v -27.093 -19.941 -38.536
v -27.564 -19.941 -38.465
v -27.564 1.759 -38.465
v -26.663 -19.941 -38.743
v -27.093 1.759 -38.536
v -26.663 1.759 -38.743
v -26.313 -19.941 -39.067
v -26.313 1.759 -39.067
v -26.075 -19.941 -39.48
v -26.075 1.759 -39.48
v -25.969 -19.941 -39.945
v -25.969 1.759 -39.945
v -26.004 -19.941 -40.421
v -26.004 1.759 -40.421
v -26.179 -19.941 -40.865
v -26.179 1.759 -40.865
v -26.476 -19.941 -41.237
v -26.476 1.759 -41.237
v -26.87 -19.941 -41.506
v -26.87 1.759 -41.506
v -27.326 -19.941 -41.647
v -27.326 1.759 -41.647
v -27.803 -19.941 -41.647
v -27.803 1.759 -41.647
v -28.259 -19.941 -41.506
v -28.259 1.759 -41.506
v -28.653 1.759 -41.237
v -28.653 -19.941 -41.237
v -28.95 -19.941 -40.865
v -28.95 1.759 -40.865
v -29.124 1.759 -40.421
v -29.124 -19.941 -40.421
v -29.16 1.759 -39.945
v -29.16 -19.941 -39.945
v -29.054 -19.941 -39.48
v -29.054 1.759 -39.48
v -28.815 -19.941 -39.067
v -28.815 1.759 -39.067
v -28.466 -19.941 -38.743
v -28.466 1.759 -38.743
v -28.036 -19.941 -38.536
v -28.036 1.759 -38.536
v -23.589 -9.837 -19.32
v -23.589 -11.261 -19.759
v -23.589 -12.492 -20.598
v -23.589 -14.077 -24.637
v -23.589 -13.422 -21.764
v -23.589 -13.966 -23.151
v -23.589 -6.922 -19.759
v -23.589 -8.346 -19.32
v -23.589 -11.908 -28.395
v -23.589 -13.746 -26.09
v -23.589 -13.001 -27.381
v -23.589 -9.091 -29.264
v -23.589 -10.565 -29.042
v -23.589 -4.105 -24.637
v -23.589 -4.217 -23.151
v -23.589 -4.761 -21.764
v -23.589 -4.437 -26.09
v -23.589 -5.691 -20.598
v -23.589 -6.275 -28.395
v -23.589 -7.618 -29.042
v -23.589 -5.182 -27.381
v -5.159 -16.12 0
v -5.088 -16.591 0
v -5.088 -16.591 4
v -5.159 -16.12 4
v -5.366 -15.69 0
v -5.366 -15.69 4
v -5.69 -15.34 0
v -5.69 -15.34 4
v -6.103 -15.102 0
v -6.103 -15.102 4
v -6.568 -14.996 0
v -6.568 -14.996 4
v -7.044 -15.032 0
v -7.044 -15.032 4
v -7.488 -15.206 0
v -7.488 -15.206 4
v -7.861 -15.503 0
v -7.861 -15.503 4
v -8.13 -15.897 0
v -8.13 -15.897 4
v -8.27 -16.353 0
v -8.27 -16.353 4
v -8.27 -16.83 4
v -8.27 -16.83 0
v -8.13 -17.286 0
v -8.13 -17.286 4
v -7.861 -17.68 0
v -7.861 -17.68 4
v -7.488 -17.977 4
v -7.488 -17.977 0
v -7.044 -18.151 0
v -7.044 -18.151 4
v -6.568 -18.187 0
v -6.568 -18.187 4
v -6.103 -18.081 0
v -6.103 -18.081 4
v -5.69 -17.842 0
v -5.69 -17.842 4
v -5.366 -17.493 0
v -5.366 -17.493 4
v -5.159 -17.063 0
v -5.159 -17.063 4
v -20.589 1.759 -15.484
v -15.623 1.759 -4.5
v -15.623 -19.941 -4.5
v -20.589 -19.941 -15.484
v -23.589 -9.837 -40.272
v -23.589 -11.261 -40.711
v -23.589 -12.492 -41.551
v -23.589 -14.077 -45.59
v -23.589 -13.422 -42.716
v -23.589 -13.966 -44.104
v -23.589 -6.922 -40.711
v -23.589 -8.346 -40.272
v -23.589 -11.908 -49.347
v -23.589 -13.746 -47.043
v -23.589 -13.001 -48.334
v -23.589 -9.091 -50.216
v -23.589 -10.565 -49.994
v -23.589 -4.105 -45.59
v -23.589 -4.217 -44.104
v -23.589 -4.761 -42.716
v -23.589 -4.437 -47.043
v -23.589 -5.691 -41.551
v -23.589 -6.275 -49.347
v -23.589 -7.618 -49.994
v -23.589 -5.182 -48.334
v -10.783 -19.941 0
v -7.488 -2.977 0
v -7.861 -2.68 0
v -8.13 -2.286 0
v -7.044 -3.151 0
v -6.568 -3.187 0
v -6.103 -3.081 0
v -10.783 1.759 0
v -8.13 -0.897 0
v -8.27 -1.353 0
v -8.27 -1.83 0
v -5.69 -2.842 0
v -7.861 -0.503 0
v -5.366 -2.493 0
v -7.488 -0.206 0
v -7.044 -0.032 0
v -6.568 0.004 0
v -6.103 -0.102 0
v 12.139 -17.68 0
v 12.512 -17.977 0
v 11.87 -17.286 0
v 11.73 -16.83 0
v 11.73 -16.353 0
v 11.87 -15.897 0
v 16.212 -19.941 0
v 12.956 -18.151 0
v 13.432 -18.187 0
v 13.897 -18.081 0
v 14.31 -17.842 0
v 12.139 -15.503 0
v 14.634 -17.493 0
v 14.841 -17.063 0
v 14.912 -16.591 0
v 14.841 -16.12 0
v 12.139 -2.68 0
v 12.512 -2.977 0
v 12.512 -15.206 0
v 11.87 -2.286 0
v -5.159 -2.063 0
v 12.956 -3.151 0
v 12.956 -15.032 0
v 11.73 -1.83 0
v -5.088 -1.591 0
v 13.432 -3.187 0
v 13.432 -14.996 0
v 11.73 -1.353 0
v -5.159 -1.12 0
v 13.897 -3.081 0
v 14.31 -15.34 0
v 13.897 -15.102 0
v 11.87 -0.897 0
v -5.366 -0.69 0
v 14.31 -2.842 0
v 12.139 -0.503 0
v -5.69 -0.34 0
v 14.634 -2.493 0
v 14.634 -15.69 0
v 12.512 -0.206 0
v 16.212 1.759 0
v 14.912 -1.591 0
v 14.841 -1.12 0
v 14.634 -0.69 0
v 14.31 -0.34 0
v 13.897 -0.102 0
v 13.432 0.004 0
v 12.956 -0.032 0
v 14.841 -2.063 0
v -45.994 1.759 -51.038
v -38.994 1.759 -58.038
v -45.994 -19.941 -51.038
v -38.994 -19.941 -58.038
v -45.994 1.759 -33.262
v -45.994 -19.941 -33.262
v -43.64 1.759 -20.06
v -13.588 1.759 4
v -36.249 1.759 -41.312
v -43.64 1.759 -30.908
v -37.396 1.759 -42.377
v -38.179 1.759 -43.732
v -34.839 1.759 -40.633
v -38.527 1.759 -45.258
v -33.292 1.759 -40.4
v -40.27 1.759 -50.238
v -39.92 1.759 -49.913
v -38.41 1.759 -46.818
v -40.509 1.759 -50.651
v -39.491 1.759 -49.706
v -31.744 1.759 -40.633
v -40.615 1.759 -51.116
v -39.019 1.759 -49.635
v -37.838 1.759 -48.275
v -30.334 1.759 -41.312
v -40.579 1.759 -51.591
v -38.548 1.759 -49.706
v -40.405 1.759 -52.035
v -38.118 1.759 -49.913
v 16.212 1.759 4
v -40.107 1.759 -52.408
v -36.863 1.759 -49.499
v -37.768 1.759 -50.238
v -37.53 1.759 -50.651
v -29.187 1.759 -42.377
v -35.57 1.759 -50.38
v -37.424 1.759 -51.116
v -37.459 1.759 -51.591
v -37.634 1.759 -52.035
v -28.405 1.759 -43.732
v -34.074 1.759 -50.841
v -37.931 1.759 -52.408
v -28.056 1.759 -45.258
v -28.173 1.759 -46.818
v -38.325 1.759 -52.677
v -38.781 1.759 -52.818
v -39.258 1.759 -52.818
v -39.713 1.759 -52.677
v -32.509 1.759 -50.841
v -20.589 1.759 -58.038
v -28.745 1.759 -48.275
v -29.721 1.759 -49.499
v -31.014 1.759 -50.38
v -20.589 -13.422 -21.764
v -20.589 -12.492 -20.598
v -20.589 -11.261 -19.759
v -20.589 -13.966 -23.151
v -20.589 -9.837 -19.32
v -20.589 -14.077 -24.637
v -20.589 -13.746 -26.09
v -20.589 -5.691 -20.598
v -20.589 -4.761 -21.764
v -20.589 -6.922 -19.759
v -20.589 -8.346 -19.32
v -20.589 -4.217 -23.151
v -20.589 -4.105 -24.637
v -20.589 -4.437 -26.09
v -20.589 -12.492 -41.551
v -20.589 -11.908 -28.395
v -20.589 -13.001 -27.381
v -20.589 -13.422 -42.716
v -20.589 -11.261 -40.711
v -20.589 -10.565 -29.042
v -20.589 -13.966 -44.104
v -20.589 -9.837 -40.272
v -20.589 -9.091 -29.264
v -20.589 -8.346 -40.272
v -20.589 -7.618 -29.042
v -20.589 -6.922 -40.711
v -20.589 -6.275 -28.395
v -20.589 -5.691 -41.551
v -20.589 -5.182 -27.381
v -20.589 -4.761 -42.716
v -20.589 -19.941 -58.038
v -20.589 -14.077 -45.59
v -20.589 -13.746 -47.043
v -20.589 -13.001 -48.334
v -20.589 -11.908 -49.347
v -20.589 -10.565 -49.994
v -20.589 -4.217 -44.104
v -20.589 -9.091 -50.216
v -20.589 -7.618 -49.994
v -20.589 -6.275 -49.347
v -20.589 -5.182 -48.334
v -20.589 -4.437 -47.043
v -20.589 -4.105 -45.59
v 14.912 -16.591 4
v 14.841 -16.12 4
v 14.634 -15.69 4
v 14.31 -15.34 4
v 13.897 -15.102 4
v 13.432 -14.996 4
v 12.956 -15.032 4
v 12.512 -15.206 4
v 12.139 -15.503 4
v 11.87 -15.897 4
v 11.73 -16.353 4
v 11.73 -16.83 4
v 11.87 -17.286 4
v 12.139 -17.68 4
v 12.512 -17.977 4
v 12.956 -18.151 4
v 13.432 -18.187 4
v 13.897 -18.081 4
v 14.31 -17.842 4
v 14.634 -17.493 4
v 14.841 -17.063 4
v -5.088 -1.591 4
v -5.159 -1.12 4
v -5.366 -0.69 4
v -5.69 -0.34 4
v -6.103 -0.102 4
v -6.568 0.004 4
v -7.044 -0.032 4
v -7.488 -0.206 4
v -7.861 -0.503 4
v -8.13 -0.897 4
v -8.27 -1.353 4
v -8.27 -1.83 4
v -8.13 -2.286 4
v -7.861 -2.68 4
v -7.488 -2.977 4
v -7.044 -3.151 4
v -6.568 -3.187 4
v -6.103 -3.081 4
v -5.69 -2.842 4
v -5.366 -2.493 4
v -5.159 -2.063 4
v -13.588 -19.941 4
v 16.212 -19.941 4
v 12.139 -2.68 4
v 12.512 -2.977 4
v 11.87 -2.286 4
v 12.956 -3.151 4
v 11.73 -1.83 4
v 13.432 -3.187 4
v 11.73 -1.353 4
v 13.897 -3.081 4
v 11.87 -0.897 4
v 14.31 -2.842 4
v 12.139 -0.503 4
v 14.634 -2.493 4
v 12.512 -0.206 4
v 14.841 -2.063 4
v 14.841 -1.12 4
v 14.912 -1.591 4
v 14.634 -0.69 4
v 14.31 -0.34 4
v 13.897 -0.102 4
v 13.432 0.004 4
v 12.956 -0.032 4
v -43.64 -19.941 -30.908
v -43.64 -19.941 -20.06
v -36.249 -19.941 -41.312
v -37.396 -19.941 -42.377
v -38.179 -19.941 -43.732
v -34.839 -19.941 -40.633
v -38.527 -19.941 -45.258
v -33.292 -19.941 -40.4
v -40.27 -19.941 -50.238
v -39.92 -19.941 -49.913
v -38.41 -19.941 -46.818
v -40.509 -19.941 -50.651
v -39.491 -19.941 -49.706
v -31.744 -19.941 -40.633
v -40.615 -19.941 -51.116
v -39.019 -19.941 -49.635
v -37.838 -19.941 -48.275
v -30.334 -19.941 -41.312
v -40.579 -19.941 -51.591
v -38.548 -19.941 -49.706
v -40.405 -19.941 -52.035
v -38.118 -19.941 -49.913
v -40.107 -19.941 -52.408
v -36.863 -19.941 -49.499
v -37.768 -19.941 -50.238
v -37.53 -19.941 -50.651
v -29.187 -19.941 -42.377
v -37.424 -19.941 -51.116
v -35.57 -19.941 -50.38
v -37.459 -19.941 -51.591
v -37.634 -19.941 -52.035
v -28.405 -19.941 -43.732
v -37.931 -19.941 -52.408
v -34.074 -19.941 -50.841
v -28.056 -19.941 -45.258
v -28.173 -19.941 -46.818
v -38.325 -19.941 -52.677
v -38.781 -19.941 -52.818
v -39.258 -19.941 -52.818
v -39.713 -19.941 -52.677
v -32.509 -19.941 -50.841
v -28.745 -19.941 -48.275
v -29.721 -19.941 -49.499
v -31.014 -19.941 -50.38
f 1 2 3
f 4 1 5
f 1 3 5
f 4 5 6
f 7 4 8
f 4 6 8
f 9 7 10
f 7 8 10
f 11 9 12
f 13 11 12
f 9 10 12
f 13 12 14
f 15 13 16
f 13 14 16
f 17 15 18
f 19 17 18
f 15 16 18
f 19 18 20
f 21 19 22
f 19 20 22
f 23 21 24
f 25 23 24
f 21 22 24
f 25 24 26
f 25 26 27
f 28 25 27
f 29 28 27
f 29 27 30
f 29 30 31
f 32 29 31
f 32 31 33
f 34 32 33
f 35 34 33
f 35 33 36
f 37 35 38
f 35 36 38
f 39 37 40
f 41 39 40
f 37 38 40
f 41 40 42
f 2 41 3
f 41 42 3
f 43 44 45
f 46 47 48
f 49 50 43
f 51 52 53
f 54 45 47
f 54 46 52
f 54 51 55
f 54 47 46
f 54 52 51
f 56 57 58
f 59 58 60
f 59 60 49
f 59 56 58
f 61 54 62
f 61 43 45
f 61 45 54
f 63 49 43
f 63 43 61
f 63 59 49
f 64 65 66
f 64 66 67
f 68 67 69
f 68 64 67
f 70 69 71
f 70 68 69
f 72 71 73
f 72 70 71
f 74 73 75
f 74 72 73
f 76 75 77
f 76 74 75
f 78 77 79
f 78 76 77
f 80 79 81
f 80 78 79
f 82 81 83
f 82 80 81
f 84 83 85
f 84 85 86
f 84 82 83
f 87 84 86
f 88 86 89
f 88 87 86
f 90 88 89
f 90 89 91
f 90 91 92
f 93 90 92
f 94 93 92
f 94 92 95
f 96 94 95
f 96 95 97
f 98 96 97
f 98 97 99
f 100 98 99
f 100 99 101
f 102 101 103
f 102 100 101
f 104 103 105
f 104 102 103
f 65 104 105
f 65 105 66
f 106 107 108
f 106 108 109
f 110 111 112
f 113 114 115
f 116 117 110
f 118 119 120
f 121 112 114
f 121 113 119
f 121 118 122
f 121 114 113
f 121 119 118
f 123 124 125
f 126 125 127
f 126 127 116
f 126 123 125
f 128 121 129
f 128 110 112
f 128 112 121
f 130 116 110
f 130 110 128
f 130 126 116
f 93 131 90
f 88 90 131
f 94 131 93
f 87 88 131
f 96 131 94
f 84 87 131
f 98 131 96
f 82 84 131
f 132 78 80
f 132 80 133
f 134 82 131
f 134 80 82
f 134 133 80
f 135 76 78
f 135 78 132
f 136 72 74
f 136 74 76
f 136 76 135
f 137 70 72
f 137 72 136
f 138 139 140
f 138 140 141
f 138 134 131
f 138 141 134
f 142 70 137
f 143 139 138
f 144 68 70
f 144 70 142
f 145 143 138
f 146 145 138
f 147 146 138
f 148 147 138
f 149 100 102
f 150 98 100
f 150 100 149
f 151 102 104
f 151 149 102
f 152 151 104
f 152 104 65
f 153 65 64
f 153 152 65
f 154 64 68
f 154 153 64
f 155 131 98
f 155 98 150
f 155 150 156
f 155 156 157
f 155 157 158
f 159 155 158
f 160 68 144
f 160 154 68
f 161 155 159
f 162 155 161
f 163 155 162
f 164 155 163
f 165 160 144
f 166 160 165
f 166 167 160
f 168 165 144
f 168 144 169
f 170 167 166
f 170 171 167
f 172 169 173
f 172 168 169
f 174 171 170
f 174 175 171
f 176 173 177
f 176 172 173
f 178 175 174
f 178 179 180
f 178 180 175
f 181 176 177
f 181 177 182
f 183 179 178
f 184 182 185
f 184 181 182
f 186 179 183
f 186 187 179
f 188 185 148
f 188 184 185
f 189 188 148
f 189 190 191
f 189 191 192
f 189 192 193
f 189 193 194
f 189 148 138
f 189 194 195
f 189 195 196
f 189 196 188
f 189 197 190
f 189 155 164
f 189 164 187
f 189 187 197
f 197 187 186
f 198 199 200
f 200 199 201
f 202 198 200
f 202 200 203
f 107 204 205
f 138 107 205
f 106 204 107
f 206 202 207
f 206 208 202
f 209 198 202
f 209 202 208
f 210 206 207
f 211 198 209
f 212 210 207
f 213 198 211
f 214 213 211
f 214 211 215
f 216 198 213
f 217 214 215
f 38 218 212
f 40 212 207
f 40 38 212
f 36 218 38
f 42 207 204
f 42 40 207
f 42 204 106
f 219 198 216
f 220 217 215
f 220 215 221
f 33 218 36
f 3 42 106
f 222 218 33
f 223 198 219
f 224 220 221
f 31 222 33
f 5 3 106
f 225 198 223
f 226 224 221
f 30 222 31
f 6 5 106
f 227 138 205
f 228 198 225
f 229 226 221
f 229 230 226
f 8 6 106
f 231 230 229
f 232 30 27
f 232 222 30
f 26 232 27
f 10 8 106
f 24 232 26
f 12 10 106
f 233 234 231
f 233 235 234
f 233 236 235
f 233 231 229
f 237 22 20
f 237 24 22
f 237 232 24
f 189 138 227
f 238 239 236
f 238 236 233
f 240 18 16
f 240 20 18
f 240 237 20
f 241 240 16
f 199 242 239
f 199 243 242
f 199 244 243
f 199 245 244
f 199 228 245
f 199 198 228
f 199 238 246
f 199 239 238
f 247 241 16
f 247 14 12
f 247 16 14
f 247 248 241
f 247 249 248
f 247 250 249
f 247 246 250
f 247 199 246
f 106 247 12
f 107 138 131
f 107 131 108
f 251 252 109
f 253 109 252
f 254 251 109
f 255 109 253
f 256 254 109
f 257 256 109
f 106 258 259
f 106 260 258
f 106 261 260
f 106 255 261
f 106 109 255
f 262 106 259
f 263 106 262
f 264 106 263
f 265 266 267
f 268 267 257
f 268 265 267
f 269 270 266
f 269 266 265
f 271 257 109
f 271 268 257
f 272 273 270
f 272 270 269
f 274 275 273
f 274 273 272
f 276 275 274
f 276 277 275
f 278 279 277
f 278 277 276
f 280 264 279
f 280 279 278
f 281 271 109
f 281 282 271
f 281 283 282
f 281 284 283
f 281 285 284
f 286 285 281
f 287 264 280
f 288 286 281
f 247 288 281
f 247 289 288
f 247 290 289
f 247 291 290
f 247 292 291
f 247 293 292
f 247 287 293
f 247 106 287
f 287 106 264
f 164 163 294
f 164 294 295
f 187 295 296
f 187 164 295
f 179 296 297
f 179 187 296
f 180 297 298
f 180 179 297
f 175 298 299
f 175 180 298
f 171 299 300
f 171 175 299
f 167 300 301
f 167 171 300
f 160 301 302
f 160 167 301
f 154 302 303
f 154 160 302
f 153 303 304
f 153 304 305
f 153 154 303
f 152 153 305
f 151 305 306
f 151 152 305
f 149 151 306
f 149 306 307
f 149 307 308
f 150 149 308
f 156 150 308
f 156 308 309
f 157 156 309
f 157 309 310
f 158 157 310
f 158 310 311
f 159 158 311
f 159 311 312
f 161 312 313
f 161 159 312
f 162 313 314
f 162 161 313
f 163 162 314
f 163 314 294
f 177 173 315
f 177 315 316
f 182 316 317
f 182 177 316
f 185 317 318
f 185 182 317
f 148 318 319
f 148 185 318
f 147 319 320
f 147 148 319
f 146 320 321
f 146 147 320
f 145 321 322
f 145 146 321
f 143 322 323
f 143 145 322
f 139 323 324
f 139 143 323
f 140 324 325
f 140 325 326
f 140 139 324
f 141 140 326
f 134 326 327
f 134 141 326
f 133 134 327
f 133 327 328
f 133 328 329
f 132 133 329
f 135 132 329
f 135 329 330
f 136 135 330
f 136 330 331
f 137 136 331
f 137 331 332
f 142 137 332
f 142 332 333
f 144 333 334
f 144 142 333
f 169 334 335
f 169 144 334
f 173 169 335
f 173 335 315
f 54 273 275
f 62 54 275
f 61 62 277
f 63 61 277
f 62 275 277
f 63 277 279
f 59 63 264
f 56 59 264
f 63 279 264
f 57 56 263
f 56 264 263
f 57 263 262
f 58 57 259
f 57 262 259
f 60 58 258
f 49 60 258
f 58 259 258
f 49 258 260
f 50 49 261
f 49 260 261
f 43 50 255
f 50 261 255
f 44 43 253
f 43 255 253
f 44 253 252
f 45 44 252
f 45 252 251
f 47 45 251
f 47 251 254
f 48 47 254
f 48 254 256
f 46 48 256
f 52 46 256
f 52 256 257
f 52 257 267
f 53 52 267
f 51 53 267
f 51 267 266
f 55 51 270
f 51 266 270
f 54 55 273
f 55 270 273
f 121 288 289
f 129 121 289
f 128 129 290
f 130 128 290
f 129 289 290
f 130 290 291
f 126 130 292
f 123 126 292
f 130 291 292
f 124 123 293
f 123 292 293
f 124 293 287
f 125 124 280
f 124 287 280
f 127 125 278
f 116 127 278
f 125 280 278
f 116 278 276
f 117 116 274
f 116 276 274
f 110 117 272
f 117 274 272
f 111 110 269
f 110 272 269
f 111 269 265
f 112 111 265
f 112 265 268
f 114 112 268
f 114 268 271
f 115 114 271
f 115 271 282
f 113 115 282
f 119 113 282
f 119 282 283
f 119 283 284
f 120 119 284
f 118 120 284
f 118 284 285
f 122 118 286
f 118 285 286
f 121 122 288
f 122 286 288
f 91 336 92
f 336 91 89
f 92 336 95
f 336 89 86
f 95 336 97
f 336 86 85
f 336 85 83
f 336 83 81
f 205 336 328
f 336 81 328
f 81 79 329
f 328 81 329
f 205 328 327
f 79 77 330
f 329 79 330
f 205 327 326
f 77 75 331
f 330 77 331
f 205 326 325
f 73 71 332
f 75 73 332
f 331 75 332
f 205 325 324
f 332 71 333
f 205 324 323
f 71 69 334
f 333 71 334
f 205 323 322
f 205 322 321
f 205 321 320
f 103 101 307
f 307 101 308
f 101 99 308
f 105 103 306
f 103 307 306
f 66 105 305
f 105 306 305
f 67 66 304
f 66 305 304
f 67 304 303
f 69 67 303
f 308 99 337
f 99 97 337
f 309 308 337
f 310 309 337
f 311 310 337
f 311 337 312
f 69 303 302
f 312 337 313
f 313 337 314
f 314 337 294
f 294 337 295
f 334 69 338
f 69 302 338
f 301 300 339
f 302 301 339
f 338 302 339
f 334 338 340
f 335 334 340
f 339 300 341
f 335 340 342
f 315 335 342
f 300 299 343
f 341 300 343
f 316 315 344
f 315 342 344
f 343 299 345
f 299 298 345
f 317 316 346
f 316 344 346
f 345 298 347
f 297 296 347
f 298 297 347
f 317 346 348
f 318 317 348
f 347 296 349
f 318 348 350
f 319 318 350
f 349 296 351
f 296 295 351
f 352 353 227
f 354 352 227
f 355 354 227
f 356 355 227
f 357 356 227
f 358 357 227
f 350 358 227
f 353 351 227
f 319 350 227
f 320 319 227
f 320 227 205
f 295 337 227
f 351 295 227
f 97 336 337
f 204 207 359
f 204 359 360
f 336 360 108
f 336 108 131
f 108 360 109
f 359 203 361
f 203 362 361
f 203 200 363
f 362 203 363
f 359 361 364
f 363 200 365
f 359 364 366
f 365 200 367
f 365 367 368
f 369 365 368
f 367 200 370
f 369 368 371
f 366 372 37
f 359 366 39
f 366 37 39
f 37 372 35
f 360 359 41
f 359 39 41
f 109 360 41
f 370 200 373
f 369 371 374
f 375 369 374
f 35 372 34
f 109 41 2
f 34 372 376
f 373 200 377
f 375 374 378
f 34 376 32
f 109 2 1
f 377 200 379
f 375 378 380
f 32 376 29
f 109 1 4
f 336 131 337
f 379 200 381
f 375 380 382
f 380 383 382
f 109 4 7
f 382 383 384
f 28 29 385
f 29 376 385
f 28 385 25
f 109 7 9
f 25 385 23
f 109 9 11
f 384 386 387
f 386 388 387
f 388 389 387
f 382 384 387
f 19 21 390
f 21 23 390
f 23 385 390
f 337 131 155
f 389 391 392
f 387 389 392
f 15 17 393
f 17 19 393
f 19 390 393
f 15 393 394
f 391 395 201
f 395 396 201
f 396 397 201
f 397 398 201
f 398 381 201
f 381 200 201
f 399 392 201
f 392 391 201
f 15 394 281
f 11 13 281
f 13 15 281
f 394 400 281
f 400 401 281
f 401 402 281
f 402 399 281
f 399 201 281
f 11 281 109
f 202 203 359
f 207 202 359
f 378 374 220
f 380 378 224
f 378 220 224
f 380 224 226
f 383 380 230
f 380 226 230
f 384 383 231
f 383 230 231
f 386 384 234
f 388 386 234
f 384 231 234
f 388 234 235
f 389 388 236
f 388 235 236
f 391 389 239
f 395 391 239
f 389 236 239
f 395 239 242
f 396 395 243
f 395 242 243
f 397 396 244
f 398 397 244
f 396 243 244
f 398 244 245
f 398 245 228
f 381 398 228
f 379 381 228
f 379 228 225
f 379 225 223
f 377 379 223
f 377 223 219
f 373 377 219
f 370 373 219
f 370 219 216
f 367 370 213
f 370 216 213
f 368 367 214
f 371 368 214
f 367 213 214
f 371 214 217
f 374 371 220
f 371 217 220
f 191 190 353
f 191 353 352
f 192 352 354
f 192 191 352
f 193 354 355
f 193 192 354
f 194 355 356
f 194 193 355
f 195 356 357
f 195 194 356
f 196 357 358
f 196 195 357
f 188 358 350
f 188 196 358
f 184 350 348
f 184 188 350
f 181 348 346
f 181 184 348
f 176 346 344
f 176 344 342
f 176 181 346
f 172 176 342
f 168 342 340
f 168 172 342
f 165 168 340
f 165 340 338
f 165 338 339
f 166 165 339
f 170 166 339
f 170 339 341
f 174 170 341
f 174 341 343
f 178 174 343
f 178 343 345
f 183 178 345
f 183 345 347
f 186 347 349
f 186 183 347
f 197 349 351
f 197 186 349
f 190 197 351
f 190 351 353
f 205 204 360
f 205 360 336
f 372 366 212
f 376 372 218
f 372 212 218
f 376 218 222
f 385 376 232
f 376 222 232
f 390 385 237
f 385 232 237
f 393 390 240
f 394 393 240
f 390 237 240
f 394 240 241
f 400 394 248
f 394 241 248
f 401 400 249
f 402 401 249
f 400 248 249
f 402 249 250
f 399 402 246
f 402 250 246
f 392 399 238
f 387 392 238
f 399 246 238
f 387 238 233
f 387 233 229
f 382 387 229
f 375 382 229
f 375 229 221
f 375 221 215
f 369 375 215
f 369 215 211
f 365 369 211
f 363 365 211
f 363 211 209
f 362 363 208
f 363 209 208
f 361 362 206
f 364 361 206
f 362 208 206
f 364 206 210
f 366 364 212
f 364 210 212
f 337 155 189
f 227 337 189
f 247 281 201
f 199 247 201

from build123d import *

# Parameters (mm, degrees)
SKICA1_W                 = 25.8
SKICA1_H                 = 21.7
SKICA1_R                 = 1.6
P_IDAT_VYSUNUT_M1_DEPTH  = 4
SKICA2_W                 = 4
SKICA2_H                 = 21.7
P_IDAT_VYSUNUT_M2_DEPTH  = 4
SKICA4_R                 = 5.25
SKICA4_R_2               = 1.6
P_IDAT_VYSUNUT_M3_DEPTH  = 21.7
ZKOSEN_1_SIZE            = 7
SKICA5_R                 = 5
ODEBRAT_VYSUNUT_M1_DEPTH = 3


with BuildPart() as part:
    # Skica1 → Přidat vysunutím1 (new body)
    with BuildSketch(Plane.XY):
        with Locations((3.311981452, -9.09140889)):
            Rectangle(SKICA1_W, SKICA1_H)
        with Locations((-6.688018548, -1.59140889)):
            Circle(SKICA1_R, mode=Mode.SUBTRACT)
        with Locations((13.311981452, -1.59140889)):
            Circle(SKICA1_R, mode=Mode.SUBTRACT)
        with Locations((13.311981452, -16.59140889)):
            Circle(SKICA1_R, mode=Mode.SUBTRACT)
        with Locations((-6.688018548, -16.59140889)):
            Circle(SKICA1_R, mode=Mode.SUBTRACT)
    extrude(amount=P_IDAT_VYSUNUT_M1_DEPTH)

    # Skica2 → Přidat vysunutím2 (add)
    with BuildSketch(Plane.ZY.offset(9.588018548)):
        with Locations((2, -9.09140889)):
            Rectangle(SKICA2_W, SKICA2_H)
    extrude(amount=P_IDAT_VYSUNUT_M2_DEPTH)

    # Skica4 → Přidat vysunutím3 (add)
    with BuildSketch(Plane(origin=(0, 1.75859111, 0), x_dir=(1, 0, 0), z_dir=(0, 1, 0))):
        Polygon((-13.588018548, -4), (-13.588018548, 0), (-10.783404097, 0), (-15.62281297, 4.500209586), (-20.589130875, 15.483860416), (-20.589130875, 33.262325999), (-20.589130875, 58.037674001), (-45.99437508, 58.037674001), (-45.99437508, 33.262325999), (-43.640152305, 30.908103223), (-43.640152305, 20.059780683), align=None)
        with Locations(Location((-33.291752977, 45.65, 0), (0, 0, 270))):
            Circle(SKICA4_R, mode=Mode.SUBTRACT)
        with Locations(Location((-39.019164168, 51.235406078, 0), (0, 0, 270))):
            Circle(SKICA4_R_2, mode=Mode.SUBTRACT)
        with Locations(Location((-27.564341787, 40.064593922, 0), (0, 0, 270))):
            Circle(SKICA4_R_2, mode=Mode.SUBTRACT)
    extrude(amount=-P_IDAT_VYSUNUT_M3_DEPTH)

    # Zkosení1
    zkosen_1_edges = [part.edges().sort_by_distance(p)[0] for p in [
        (-45.99437508, -9.09140889, -58.037674001),
    ]]
    chamfer(zkosen_1_edges, length=ZKOSEN_1_SIZE)

    # Skica5 → Odebrat vysunutím1 (cut)
    with BuildSketch(Plane(origin=(-20.589130875, 0, 0), x_dir=(0, 0, -1), z_dir=(1, 0, 0))):
        with Locations((24.263711451, -9.09140889)):
            Circle(SKICA5_R)
        with Locations((45.216218307, -9.09140889)):
            Circle(SKICA5_R)
    extrude(amount=-ODEBRAT_VYSUNUT_M1_DEPTH, mode=Mode.SUBTRACT)


solid = part.part
